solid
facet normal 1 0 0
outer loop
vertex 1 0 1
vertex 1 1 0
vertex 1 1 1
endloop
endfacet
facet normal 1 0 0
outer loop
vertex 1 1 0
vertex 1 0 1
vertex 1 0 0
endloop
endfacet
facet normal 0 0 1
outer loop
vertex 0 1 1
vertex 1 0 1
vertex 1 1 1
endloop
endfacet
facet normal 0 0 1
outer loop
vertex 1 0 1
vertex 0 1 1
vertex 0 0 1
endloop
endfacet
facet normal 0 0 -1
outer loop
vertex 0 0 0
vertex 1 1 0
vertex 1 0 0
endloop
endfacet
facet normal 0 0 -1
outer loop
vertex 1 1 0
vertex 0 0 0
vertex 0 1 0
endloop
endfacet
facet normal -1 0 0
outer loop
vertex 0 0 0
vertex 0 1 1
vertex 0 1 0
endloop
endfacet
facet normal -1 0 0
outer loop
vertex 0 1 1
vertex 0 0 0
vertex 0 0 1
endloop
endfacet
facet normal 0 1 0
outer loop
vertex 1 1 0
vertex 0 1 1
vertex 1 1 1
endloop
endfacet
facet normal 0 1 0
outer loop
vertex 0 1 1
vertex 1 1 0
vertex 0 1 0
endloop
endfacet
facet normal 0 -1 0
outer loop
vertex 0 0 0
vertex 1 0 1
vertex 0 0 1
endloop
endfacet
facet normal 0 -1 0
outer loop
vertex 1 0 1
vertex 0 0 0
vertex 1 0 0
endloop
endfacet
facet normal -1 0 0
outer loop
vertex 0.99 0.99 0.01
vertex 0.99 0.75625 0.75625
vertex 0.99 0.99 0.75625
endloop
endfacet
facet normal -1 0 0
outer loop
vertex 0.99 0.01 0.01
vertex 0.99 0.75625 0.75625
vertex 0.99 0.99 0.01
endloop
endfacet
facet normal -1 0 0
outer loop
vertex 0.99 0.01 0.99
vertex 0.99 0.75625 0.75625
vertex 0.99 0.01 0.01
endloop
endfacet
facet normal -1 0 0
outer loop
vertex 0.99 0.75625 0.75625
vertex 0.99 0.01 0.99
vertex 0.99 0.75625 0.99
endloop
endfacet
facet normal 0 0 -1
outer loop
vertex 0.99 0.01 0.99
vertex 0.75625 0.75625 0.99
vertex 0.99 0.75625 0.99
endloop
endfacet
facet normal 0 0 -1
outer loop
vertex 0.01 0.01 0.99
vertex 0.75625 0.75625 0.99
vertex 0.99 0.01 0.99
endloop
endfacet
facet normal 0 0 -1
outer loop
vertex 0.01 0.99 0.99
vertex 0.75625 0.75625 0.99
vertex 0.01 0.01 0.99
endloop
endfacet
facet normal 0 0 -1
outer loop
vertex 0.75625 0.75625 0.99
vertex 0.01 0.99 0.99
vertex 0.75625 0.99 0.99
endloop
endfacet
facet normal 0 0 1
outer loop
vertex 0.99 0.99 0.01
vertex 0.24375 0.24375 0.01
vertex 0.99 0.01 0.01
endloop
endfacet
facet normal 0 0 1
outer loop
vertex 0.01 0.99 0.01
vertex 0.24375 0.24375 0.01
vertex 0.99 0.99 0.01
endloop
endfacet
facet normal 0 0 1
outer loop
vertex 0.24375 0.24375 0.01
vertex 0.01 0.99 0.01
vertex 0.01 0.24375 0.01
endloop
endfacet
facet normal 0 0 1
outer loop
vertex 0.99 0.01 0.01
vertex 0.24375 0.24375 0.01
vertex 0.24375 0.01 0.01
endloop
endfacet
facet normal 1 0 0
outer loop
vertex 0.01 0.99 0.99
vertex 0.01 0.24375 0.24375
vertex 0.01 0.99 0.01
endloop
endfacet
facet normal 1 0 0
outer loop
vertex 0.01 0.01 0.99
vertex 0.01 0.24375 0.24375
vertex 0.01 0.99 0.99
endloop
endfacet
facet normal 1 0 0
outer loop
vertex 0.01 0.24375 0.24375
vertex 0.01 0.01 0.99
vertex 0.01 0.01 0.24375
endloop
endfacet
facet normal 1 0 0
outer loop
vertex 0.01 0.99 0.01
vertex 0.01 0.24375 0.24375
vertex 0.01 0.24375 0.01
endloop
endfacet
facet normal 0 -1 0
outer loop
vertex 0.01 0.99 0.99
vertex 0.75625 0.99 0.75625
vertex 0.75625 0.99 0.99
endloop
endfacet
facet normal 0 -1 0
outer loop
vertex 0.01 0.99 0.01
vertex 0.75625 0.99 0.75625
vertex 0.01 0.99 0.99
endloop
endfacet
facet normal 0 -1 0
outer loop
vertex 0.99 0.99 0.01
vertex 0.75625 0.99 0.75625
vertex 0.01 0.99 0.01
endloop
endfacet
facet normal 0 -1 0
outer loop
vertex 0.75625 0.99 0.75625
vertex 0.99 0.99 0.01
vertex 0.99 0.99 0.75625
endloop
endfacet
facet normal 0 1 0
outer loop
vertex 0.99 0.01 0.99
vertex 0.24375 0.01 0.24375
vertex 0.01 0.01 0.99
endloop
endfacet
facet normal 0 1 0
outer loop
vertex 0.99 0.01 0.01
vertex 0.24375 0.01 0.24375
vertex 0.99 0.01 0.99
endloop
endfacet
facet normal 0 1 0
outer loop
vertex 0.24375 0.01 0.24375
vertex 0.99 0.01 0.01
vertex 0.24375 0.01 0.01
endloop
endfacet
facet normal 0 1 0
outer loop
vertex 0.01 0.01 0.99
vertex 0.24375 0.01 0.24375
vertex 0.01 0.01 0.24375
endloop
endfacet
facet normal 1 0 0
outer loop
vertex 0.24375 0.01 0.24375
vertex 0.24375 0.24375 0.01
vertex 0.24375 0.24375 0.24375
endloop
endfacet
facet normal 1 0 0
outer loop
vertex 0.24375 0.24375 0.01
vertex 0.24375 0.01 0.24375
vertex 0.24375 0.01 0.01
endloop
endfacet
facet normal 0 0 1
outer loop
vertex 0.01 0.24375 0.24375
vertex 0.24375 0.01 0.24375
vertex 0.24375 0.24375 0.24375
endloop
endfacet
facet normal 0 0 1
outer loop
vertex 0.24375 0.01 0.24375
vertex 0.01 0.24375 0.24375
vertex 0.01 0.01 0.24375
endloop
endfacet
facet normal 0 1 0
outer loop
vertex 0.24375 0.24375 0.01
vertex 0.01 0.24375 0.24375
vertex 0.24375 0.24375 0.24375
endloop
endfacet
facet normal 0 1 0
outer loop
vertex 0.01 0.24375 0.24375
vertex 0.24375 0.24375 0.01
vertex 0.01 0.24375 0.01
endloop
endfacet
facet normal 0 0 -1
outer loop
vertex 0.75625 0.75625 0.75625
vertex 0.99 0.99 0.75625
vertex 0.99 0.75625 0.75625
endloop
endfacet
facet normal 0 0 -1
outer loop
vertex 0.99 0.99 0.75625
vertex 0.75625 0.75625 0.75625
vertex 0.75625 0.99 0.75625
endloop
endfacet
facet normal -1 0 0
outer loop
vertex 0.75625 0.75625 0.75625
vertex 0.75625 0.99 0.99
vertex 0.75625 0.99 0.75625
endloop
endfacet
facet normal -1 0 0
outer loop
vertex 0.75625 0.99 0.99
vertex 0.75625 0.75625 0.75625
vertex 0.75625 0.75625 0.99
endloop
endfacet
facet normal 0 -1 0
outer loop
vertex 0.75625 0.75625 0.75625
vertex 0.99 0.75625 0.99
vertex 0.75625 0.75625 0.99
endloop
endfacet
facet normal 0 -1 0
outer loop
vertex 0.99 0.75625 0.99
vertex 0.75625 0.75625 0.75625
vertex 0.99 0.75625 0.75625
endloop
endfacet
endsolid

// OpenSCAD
translate([0.125, 0.125, 0.125]) color([0.5710134097643395, 0.25063752032270836, 0.1616047095065578]) cube([0.2375, 0.2375, 0.2375], center=true);
translate([0.875, 0.875, 0.875]) color([0.649882641178458, 0.07676307518082648, 0.795763250406789]) cube([0.2375, 0.2375, 0.2375], center=true);
color([0.3,0.3,0.3,0.3]) difference() { cube([1,1,1]); translate([0.01,0.01,0.01]) cube([0.98,0.98,0.98]); }
